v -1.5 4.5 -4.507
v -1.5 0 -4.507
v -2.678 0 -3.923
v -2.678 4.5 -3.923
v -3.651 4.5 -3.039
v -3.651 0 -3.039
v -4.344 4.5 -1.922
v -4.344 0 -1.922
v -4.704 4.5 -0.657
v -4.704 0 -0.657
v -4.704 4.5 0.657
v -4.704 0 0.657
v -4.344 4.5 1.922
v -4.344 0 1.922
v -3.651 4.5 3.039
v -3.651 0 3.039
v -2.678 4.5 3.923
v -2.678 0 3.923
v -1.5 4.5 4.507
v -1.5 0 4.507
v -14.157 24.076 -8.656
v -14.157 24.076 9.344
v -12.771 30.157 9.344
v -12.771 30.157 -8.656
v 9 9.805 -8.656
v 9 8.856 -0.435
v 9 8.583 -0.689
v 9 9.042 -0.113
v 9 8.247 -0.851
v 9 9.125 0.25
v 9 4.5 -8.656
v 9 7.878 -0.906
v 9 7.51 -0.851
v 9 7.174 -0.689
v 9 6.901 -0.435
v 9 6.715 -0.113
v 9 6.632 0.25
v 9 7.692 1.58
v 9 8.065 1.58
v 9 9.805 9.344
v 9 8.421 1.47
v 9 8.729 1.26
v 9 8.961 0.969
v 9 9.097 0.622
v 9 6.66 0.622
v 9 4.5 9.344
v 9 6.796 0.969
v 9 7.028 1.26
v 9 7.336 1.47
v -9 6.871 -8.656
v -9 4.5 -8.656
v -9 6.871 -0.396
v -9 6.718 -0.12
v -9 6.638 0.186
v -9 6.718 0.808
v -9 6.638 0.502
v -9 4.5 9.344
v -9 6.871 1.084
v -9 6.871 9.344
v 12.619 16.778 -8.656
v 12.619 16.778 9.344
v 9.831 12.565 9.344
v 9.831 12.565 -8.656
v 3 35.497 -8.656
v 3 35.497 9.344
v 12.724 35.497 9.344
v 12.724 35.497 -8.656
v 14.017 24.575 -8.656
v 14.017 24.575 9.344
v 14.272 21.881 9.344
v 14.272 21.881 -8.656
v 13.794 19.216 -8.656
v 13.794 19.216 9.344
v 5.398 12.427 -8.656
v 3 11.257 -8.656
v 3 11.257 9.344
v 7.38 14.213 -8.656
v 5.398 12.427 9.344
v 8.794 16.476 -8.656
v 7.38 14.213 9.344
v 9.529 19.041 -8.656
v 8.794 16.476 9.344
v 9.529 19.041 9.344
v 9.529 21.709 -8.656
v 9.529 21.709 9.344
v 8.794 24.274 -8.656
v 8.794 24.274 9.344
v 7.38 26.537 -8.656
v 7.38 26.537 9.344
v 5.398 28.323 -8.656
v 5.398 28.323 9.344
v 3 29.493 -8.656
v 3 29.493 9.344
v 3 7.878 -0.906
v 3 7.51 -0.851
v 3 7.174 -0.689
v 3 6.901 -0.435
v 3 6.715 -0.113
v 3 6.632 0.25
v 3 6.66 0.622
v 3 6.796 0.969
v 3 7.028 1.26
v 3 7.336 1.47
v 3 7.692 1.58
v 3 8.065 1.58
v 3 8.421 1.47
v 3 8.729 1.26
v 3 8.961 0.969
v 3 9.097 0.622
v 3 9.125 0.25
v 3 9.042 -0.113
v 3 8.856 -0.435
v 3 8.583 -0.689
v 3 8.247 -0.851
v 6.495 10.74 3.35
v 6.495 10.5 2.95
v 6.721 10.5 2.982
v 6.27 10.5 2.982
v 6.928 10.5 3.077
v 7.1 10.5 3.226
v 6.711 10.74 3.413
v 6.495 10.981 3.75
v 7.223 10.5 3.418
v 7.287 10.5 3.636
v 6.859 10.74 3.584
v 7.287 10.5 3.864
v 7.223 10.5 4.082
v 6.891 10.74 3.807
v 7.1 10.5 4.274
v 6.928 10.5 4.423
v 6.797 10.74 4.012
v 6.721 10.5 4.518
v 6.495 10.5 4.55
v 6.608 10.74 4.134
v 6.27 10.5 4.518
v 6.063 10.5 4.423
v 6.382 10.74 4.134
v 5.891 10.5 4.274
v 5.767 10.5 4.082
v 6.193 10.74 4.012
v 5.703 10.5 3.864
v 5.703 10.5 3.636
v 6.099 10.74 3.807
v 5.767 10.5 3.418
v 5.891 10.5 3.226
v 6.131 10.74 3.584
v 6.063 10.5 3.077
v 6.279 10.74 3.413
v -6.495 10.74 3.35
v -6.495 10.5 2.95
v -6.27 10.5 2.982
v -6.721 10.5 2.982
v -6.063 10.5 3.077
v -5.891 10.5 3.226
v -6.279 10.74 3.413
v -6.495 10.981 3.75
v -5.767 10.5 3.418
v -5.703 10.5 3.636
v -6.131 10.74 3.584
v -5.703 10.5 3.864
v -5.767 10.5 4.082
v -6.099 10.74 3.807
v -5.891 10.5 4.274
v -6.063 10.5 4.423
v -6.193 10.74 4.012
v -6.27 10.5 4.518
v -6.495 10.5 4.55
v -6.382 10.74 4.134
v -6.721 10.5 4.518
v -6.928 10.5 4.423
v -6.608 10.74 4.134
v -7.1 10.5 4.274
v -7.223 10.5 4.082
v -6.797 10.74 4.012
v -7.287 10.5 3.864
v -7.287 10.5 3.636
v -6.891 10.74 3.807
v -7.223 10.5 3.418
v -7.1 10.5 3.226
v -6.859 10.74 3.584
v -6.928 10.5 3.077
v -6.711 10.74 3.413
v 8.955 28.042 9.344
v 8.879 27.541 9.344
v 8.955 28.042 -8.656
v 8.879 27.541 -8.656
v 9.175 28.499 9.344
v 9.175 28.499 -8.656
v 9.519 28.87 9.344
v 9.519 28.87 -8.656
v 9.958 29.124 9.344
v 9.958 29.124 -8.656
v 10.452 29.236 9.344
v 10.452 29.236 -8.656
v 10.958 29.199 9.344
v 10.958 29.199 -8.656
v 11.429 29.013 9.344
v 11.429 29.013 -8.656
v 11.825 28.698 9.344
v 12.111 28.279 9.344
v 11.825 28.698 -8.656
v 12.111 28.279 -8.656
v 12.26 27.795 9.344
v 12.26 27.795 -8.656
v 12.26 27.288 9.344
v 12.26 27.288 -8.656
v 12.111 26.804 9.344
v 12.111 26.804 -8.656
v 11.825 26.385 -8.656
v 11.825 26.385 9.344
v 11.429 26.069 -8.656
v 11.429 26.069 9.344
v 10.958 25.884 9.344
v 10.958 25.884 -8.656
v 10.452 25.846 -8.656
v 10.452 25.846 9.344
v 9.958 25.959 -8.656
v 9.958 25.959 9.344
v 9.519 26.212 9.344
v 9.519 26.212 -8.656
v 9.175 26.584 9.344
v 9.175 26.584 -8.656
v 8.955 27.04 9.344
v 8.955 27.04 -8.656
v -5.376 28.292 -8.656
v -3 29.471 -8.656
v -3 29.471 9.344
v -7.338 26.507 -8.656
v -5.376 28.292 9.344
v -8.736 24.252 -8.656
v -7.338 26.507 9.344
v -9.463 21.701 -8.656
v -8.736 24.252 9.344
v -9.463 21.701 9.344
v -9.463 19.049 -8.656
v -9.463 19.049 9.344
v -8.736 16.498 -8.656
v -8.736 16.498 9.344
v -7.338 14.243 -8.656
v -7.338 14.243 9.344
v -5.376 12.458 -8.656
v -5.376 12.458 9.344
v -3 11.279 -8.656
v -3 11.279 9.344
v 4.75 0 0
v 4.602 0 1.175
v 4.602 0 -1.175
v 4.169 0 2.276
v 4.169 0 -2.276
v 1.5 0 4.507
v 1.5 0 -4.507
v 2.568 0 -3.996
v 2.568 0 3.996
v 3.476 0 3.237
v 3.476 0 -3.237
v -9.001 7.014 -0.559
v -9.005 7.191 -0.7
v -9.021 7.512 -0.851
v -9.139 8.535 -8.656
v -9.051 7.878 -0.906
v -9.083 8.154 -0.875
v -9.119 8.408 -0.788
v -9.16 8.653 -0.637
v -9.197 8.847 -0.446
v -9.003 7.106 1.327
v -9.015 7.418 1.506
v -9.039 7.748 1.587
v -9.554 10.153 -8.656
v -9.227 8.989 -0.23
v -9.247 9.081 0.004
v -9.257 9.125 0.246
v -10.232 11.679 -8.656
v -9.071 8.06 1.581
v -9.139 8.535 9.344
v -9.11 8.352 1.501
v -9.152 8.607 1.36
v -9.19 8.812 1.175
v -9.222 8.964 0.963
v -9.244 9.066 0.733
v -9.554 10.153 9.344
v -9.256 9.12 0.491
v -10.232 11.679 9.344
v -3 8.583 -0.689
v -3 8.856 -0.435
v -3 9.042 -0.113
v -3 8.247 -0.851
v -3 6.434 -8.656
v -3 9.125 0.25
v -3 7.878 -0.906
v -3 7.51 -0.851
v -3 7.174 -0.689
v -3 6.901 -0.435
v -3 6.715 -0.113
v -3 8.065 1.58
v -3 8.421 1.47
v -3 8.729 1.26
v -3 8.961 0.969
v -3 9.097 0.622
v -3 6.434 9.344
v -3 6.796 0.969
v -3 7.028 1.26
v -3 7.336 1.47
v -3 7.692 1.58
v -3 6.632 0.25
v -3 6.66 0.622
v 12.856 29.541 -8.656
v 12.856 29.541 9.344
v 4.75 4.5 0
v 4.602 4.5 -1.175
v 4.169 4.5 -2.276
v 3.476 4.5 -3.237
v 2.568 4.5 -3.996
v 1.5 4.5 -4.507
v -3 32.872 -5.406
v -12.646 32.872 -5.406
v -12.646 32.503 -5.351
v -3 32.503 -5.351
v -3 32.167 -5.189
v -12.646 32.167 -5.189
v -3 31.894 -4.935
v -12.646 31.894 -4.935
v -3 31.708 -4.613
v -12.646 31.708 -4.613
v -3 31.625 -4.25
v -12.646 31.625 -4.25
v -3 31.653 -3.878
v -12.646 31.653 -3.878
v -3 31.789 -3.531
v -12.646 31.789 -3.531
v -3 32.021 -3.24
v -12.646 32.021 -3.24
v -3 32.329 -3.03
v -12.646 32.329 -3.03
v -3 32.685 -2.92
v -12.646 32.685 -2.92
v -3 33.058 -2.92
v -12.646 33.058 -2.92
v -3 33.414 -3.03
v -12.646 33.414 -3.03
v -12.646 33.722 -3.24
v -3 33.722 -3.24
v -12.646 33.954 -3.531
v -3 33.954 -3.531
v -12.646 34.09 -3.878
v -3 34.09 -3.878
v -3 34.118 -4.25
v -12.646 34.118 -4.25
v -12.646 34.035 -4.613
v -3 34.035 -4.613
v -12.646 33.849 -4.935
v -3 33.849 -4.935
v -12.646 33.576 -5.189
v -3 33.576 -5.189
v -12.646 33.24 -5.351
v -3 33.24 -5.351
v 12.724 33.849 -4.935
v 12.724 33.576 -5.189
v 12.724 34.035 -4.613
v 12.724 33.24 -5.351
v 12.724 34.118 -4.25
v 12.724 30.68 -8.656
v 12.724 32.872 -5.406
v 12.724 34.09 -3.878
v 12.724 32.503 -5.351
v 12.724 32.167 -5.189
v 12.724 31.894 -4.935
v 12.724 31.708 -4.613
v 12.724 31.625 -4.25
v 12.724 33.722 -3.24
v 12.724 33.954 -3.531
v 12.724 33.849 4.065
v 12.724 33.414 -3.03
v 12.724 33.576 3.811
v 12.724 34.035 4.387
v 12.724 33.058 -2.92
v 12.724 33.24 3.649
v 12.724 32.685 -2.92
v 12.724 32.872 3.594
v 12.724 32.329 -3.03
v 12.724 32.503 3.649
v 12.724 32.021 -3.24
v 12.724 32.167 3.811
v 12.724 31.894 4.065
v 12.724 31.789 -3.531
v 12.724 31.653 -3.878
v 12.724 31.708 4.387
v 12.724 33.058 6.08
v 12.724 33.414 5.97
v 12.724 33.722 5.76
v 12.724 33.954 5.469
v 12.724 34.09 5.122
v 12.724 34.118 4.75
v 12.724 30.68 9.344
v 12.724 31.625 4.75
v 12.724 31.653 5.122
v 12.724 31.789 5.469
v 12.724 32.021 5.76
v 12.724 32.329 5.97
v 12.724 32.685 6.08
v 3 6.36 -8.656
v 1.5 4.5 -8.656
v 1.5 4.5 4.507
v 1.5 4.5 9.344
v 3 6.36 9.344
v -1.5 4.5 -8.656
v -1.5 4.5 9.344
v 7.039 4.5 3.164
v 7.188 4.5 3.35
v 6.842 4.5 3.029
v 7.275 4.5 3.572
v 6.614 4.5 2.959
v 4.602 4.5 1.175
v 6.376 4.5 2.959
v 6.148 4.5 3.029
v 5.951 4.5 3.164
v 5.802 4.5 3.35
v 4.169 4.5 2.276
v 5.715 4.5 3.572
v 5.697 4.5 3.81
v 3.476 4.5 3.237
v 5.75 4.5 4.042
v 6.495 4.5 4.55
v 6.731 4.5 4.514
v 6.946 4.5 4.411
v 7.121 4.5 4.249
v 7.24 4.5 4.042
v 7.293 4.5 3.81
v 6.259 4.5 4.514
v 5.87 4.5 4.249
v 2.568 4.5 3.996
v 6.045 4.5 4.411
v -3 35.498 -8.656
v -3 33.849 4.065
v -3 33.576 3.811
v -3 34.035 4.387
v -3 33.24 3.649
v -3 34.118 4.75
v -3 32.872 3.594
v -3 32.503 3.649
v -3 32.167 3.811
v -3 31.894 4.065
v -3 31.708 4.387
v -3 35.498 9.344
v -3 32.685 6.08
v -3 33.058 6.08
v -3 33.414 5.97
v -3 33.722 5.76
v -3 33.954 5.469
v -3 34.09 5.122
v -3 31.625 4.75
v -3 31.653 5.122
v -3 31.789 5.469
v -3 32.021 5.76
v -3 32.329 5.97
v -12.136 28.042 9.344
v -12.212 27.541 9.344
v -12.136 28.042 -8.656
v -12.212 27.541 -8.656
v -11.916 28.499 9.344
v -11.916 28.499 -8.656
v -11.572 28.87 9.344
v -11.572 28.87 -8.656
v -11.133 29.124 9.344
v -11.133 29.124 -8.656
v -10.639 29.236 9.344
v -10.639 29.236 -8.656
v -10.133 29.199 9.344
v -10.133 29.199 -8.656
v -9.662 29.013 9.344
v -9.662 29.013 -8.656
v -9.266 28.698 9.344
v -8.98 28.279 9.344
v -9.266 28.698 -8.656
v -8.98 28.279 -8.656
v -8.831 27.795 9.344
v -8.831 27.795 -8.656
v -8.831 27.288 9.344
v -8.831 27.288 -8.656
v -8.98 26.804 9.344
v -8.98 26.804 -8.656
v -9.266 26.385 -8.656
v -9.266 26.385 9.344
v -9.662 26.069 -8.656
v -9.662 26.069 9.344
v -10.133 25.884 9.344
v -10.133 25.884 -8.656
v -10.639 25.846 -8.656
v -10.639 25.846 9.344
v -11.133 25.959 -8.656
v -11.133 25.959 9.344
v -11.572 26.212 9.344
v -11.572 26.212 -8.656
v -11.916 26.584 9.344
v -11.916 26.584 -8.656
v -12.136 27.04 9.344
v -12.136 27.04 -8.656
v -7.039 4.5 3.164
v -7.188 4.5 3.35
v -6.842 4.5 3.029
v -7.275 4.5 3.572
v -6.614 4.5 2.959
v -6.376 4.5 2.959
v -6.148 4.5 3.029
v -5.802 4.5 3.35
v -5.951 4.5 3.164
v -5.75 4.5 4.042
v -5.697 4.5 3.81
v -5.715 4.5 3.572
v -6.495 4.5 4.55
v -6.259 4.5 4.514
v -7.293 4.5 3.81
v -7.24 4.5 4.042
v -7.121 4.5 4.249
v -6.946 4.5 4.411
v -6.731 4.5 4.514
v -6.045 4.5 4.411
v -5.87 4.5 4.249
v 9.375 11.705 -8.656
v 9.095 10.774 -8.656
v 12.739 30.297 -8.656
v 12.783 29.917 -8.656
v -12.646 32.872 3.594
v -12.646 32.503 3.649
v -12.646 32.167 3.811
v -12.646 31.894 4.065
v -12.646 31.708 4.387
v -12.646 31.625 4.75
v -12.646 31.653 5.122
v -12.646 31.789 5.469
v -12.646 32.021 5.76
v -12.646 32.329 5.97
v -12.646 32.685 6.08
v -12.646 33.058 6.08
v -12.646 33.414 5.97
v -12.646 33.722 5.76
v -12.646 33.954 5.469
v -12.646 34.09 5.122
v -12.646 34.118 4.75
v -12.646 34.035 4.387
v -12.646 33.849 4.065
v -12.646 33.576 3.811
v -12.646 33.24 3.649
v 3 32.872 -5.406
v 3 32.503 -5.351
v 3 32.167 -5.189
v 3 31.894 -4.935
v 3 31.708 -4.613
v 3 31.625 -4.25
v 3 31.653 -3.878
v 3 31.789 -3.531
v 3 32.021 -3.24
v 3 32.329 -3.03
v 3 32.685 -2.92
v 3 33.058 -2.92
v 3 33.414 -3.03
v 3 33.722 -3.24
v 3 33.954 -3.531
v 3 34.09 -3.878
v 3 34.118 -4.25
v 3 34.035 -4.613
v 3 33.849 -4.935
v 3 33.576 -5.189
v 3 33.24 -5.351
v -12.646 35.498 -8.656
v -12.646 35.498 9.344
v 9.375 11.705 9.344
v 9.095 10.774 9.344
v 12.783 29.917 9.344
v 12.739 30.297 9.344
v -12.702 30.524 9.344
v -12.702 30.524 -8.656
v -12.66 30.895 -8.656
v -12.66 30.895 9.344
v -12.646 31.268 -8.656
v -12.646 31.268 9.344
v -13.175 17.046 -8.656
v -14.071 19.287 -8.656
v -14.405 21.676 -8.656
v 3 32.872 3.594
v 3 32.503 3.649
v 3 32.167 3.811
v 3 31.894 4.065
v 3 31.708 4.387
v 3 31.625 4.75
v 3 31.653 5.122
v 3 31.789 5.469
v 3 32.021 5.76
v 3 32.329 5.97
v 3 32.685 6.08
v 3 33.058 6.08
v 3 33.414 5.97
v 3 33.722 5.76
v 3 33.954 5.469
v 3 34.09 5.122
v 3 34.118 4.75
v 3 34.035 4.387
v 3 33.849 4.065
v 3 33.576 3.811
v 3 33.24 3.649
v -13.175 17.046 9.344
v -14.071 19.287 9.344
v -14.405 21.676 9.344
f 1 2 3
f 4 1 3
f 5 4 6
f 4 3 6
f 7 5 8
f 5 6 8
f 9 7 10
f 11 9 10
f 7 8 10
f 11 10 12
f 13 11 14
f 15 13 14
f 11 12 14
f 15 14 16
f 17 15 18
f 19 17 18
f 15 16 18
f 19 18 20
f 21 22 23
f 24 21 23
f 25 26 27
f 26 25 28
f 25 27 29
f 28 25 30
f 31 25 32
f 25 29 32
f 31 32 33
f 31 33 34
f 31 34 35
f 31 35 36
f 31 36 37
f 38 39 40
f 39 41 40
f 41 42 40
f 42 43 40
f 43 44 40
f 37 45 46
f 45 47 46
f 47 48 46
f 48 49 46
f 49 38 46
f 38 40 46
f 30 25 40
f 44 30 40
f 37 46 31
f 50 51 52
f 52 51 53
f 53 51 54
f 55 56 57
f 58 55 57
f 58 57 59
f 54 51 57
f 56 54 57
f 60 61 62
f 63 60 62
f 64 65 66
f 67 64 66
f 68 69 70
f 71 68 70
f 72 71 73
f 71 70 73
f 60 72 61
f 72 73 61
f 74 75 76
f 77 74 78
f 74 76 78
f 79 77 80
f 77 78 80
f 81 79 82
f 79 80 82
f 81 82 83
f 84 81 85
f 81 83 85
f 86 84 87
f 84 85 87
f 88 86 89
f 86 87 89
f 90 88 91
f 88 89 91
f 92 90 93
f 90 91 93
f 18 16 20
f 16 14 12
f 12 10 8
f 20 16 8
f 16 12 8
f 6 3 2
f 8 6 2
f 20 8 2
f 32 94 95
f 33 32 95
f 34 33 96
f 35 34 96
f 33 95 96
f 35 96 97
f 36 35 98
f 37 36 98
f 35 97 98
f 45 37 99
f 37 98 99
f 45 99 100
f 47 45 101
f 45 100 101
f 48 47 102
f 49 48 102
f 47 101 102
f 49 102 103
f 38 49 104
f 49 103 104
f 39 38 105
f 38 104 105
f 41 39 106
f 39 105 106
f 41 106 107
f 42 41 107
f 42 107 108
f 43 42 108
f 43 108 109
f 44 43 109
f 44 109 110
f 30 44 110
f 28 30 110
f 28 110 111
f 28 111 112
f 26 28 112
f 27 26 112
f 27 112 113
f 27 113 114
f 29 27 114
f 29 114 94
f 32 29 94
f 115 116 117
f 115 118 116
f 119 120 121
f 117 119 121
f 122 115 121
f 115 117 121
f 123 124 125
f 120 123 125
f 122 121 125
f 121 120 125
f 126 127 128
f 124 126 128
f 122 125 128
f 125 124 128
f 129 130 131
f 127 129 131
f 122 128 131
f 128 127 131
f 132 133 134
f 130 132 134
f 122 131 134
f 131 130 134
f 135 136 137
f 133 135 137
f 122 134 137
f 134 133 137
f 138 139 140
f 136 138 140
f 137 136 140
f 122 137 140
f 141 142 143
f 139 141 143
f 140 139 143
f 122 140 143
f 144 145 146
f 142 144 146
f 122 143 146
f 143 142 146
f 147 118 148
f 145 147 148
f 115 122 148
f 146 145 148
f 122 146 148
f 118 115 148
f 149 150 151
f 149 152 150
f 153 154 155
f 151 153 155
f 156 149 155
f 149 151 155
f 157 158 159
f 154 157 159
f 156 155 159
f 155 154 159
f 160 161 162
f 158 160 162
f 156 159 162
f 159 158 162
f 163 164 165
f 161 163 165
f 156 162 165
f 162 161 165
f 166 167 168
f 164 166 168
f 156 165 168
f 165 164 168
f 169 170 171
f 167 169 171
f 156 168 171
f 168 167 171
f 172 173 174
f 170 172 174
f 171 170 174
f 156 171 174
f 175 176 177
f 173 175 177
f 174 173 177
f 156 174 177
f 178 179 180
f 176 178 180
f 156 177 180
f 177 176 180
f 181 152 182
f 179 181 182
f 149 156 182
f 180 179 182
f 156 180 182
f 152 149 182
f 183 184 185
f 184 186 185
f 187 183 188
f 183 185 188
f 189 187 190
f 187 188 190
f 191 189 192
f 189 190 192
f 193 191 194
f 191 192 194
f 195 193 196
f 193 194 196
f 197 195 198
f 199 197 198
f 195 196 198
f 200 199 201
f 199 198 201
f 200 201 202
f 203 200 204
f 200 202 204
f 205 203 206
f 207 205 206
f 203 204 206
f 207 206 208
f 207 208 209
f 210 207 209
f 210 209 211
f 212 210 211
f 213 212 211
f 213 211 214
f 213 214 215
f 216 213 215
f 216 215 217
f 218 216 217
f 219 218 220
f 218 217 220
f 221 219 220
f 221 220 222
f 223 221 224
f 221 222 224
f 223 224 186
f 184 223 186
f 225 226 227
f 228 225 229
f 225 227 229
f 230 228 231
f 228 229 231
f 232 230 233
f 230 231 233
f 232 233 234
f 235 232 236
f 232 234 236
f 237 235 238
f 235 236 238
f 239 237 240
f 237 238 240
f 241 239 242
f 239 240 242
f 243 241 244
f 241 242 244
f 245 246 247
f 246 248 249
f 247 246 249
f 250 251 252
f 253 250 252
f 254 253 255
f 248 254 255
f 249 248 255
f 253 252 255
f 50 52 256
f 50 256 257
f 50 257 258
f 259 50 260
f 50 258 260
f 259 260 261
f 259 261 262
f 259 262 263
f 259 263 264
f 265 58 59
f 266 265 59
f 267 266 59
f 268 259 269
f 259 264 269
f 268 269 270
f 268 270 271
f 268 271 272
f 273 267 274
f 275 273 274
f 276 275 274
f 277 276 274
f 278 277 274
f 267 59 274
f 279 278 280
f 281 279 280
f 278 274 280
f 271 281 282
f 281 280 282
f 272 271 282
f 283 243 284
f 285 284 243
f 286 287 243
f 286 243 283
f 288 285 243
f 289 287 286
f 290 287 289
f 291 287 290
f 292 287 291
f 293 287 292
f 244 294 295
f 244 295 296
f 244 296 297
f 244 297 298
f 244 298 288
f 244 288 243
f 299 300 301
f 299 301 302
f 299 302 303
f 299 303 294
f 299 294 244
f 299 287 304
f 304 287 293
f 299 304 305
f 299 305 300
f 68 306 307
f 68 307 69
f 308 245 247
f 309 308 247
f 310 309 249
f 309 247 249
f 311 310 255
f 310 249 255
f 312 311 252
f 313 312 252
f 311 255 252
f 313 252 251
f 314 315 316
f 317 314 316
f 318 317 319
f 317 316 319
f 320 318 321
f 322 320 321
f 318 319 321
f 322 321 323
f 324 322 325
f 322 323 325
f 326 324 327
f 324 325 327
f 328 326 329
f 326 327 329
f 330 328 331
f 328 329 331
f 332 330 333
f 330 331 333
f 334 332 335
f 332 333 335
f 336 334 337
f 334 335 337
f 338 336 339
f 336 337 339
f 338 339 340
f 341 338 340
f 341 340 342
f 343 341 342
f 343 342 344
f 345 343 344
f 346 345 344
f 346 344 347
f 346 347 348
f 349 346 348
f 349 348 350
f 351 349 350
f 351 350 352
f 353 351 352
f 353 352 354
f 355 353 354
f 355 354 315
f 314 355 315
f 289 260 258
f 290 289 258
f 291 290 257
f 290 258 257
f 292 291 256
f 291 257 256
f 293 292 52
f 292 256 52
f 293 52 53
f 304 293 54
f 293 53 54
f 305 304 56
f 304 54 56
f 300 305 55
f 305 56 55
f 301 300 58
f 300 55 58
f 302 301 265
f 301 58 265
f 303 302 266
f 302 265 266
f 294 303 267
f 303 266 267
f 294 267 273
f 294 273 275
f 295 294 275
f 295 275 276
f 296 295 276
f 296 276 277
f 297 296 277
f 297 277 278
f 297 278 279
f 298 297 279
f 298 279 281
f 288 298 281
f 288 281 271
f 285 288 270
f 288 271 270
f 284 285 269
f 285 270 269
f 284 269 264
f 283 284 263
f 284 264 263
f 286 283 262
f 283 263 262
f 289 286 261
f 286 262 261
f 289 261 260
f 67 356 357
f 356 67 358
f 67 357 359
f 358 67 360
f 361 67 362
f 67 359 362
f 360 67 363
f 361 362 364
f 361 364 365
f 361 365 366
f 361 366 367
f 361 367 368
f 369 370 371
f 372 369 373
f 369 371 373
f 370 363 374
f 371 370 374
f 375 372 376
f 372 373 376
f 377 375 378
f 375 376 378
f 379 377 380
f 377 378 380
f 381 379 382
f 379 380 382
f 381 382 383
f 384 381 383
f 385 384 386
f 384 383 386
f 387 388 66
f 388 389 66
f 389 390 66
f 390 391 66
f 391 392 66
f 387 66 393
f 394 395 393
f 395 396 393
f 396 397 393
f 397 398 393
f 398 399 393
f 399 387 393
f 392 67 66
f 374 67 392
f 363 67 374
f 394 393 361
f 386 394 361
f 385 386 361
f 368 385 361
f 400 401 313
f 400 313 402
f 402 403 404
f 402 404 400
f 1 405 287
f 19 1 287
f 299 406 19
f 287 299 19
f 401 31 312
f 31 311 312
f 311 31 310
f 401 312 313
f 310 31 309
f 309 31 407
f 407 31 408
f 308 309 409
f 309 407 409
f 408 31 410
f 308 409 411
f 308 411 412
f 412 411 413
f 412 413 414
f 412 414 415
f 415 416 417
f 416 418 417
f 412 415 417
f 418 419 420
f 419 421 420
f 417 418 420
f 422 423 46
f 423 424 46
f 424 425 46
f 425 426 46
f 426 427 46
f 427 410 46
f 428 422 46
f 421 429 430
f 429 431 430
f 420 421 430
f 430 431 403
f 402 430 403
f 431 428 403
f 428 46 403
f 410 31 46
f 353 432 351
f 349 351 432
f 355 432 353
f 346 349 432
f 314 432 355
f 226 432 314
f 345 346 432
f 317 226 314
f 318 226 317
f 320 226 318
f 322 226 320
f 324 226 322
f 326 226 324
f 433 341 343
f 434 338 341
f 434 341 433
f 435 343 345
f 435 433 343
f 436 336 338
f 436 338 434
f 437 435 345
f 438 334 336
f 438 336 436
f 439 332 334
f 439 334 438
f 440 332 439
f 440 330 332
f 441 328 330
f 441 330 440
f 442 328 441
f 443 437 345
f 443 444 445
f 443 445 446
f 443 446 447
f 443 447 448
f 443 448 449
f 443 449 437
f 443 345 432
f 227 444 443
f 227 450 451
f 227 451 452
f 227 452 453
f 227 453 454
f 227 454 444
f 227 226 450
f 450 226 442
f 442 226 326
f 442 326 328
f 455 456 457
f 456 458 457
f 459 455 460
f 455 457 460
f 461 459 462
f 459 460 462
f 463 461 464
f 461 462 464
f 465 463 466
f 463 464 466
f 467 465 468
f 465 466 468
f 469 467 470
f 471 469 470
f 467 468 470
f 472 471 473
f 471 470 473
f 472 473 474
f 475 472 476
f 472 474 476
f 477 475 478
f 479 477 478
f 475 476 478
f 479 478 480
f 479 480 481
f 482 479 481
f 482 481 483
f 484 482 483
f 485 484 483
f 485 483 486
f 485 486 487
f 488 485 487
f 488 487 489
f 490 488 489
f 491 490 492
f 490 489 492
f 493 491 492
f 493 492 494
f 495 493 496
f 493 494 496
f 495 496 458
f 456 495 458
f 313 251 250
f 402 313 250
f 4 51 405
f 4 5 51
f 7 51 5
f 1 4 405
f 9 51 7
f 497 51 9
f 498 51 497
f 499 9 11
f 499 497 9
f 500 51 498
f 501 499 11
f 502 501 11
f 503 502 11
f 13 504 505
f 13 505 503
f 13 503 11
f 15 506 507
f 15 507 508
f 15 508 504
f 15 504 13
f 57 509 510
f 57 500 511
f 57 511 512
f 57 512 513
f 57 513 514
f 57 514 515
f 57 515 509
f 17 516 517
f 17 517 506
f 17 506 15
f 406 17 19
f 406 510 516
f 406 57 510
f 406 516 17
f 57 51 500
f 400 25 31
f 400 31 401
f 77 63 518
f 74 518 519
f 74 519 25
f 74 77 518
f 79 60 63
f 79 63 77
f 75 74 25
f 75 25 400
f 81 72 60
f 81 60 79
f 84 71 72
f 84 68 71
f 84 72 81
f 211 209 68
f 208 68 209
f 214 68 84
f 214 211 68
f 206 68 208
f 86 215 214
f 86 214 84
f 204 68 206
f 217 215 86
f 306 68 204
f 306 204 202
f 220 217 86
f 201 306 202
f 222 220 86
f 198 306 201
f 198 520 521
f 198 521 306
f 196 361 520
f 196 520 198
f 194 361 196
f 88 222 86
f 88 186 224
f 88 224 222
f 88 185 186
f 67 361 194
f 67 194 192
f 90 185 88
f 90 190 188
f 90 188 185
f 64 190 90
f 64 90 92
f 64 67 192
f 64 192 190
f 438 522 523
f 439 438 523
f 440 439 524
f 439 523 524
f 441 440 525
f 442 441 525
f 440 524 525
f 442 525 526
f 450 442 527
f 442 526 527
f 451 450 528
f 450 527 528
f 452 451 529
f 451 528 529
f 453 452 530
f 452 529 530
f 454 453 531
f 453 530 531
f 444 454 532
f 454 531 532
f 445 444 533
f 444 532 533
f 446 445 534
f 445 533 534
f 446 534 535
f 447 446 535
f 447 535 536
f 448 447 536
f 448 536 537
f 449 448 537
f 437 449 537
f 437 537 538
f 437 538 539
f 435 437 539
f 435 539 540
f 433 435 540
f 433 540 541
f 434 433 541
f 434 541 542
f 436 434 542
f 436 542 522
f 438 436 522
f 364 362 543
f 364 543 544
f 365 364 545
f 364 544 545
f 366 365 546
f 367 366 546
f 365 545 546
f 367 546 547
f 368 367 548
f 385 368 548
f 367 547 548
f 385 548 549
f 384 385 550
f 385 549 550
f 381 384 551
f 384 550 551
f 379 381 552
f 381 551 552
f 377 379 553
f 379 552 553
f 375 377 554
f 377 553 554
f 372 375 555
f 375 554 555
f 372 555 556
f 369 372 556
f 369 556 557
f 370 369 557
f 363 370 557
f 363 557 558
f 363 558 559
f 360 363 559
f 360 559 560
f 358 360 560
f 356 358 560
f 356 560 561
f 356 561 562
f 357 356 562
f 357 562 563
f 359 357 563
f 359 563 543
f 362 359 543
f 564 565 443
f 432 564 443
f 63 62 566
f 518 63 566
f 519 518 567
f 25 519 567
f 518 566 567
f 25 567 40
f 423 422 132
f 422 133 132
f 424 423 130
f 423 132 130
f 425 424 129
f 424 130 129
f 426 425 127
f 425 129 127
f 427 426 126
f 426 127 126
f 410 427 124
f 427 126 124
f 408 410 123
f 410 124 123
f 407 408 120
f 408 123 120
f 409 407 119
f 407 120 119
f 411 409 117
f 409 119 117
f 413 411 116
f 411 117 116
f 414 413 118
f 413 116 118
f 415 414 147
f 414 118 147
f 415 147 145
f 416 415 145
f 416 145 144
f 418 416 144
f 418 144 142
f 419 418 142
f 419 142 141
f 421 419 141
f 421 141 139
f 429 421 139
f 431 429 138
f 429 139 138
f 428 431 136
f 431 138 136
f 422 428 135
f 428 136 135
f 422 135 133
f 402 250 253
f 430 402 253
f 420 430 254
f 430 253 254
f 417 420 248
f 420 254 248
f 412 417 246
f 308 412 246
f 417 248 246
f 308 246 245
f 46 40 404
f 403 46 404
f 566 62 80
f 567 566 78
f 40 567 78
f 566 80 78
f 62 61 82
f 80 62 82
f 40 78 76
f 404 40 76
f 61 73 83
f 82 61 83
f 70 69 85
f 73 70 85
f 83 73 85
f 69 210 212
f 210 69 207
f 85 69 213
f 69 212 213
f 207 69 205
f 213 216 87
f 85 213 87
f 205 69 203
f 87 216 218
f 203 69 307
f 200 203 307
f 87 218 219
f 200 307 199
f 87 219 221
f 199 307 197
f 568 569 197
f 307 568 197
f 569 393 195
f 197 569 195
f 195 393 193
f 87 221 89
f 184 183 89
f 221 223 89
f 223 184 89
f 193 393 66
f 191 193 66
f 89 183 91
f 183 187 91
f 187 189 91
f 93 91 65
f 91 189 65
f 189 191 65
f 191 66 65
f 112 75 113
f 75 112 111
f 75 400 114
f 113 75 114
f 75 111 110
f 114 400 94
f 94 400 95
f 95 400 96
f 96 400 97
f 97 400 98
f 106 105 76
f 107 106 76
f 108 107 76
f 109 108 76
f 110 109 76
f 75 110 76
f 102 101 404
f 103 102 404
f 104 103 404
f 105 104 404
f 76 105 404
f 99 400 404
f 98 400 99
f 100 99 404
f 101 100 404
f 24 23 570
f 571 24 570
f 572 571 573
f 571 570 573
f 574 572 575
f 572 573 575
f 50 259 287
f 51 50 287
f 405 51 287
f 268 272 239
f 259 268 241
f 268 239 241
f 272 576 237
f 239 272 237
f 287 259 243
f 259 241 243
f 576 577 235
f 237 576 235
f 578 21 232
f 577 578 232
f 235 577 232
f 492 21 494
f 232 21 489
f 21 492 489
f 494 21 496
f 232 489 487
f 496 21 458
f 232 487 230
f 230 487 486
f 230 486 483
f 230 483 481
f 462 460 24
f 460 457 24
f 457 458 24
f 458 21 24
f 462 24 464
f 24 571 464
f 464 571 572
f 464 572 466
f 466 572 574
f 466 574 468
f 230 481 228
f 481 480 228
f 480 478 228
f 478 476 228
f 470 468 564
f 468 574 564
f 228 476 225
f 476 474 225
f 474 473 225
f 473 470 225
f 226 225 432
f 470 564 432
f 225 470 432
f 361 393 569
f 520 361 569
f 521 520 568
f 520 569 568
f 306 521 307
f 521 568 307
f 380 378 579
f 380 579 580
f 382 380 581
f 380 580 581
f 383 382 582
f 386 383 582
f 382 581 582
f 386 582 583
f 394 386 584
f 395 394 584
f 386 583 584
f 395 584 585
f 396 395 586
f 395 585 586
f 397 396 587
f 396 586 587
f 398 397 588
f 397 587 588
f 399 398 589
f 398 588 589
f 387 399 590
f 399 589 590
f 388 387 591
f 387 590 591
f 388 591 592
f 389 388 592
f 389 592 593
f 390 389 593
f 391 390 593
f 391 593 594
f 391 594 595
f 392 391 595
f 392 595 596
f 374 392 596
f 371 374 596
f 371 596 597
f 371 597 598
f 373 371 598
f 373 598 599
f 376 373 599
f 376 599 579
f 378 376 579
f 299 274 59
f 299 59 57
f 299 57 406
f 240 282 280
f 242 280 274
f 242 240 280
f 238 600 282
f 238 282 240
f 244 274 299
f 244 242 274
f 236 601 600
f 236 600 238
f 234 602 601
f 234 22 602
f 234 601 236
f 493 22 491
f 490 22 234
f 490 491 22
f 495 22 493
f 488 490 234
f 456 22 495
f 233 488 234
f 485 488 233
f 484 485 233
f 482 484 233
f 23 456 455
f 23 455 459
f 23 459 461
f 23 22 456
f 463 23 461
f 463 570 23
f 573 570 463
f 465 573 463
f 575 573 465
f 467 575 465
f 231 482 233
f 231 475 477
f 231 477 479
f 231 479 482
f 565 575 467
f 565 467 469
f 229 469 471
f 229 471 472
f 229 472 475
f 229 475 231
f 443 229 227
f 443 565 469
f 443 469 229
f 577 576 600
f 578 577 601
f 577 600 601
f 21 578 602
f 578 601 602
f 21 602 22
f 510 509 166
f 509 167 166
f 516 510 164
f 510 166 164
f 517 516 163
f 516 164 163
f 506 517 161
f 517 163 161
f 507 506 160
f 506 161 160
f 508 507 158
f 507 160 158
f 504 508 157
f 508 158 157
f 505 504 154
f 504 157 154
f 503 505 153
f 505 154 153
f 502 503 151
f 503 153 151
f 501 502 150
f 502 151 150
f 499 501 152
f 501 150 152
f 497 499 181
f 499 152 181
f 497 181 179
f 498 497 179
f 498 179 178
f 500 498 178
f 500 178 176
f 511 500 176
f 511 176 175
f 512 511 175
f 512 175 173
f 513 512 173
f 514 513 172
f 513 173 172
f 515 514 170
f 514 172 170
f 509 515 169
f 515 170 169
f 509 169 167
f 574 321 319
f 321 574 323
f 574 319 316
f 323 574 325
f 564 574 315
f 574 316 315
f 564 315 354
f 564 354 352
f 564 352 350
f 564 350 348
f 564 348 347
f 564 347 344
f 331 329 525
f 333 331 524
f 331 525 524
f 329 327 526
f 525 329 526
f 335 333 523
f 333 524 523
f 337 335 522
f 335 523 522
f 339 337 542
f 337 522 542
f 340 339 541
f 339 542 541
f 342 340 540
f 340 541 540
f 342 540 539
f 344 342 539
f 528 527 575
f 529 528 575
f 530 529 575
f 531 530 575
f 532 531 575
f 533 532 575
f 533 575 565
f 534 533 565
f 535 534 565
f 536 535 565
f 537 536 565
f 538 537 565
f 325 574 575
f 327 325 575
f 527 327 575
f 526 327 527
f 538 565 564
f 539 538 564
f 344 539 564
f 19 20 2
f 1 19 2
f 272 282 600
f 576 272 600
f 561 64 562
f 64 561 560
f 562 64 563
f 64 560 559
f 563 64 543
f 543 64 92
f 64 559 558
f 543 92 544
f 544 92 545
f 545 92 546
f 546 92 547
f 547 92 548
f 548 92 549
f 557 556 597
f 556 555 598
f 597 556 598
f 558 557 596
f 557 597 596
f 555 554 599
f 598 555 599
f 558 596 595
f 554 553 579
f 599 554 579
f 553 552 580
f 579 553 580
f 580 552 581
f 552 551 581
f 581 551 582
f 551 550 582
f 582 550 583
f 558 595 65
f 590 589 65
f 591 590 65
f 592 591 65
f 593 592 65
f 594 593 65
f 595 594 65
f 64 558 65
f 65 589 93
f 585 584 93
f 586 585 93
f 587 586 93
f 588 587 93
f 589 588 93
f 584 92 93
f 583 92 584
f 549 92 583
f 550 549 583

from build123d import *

# Parameters (mm, degrees)
SKETCH2_W                 = 12
SKETCH2_H                 = 18
EXTRUDE1_DEPTH            = 31.75
EXTRUDE1_2_DEPTH          = 31.75
EXTRUDE2_DEPTH            = 4.5
SKETCH4_R                 = 9.5885
MAGNET_CAVITY_DEPTH       = 19
M3X0_5_TAPPED_HOLE1_D     = 2.5
M2X0_4_TAPPED_HOLE2_D     = 1.6
M2X0_4_TAPPED_HOLE2_DEPTH = 6
M2X0_4_TAPPED_HOLE2_TIP   = 0.480688495
M3_CLEARANCE_HOLE1_D      = 3.4
M3_CLEARANCE_HOLE1_DEPTH  = 18
M3_CLEARANCE_HOLE1_TIP    = 1.021463052
EXTRUDE3_DEPTH            = 19
EXTRUDE4_DEPTH            = 18
EXTRUDE5_DEPTH            = 19
EXTRUDE6_DEPTH            = 18


with BuildPart() as part:
    # Sketch2 → Extrude1 (new body)
    with BuildSketch(Plane(origin=(0, 4.5, 0), x_dir=(-1, 0, 0), z_dir=(0, 1, 0))):
        with Locations((9, 0.343878918)):
            Rectangle(SKETCH2_W, SKETCH2_H)
    extrude(amount=EXTRUDE1_DEPTH)



with BuildPart() as body_2:
    # Sketch2 → Extrude1 2 (new body)
    with BuildSketch(Plane(origin=(0, 4.5, 0), x_dir=(-1, 0, 0), z_dir=(0, 1, 0))):
        with Locations((-9, 0.343878918)):
            Rectangle(SKETCH2_W, SKETCH2_H)
    extrude(amount=EXTRUDE1_2_DEPTH)


with BuildPart() as part_1:
    add(part.part)

    add(body_2.part)  # Extrude2 merges body 2
    # Sketch1 → Extrude2 (add)
    with BuildSketch(Plane(origin=(0, 0, 0), x_dir=(1, 0, 0), z_dir=(0, 1, 0))):
        with BuildLine():
            ThreePointArc((4.75, 0), (3.852758752, 2.778263846), (1.5, 4.506939094))
            Line((1.5, 4.506939094), (1.5, -4.506939094))
            ThreePointArc((1.5, -4.506939094), (3.852758752, -2.778263846), (4.75, 0))
        make_face()
        with BuildLine():
            Line((-1.5, -4.506939094), (-1.5, 4.506939094))
            ThreePointArc((-1.5, 4.506939094), (-4.75, 0), (-1.5, -4.506939094))
        make_face()
    extrude(amount=EXTRUDE2_DEPTH)

    # Sketch4 → Magnet Cavity (cut, through all)
    with BuildSketch(Plane.XY.offset(9.343878918)):
        with Locations((0.033766691, 20.375)):
            Circle(SKETCH4_R)
    extrude(amount=-MAGNET_CAVITY_DEPTH, mode=Mode.SUBTRACT)

    # M3x0.5 Tapped Hole1 (through all)
    with Locations(Plane(origin=(15, 32.871578641, 4.843878918), x_dir=(0, 0, 1), z_dir=(1, 0, 0))):
        with Locations((0, 0), (-9, 0), (-4.5, 24.993157282)):
            Hole(M3X0_5_TAPPED_HOLE1_D / 2)

    # M2x0.4 Tapped Hole2
    with Locations(Plane(origin=(-6.495190528, 4.5, 3.75), x_dir=(0, 0, -1), z_dir=(0, -1, 0))):
        with Locations((0, 0), (0, 12.990381056)):
            Hole(M2X0_4_TAPPED_HOLE2_D / 2, depth=M2X0_4_TAPPED_HOLE2_DEPTH)
            with Locations((0, 0, -(M2X0_4_TAPPED_HOLE2_DEPTH + M2X0_4_TAPPED_HOLE2_TIP / 2))):  # 118° drill point
                Cone(0, M2X0_4_TAPPED_HOLE2_D / 2, M2X0_4_TAPPED_HOLE2_TIP, mode=Mode.SUBTRACT)

    # M3 Clearance Hole1
    with Locations(Plane(origin=(-10.511737105, 27.54122981, 9.343878918), x_dir=(1, 0, 0), z_dir=(0, 0, 1))):
        with Locations((0, 0), (21.091007592, 0)):
            Hole(M3_CLEARANCE_HOLE1_D / 2, depth=M3_CLEARANCE_HOLE1_DEPTH)
            with Locations((0, 0, -(M3_CLEARANCE_HOLE1_DEPTH + M3_CLEARANCE_HOLE1_TIP / 2))):  # 118° drill point
                Cone(0, M3_CLEARANCE_HOLE1_D / 2, M3_CLEARANCE_HOLE1_TIP, mode=Mode.SUBTRACT)

    # Trim Sketch → Extrude3 (cut, through all)
    with BuildSketch(Plane.XY.offset(9.343878918)):
        with BuildLine():
            Line((9, 9.805409948), (9, 4.5))
            Line((9, 4.5), (15, 4.5))
            Line((15, 4.5), (15, 36.25))
            Line((15, 36.25), (3, 36.25))
            Line((3, 36.25), (3, 35.497310661))
            Line((3, 35.497310661), (12.724200068, 35.497310661))
            Line((12.724200068, 35.497310661), (12.724200068, 30.679595884))
            ThreePointArc((12.724200068, 30.679595884), (12.757175017, 30.10630526), (12.855664924, 29.540576328))
            Line((12.855664924, 29.540576328), (14.017302884, 24.575362865))
            ThreePointArc((14.017302884, 24.575362865), (14.123221889, 20.532228354), (12.6190094, 16.777830894))
            Line((12.6190094, 16.777830894), (9.830611598, 12.565156378))
            ThreePointArc((9.830611598, 12.565156378), (9.212153824, 11.246426602), (9, 9.805409948))
        make_face()
    extrude(amount=-EXTRUDE3_DEPTH, mode=Mode.SUBTRACT)

    # Sketch26 → Extrude4 (add)
    with BuildSketch(Plane.XY.offset(9.343878918)):
        Polygon((1.5, 4.5), (3, 6.359966873), (3, 4.5), align=None)
    extrude(amount=-EXTRUDE4_DEPTH)

    # Sketch27 → Extrude5 (cut, through all)
    with BuildSketch(Plane.XY.offset(9.343878918)):
        with BuildLine():
            ThreePointArc((-13.174851017, 17.046466622), (-14.310417023, 20.471304097), (-14.156594035, 24.076211914))
            Line((-14.156594035, 24.076211914), (-12.770998882, 30.156772756))
            ThreePointArc((-12.770998882, 30.156772756), (-12.677370472, 30.708713017), (-12.646030039, 31.267660339))
            Line((-12.646030039, 31.267660339), (-12.646030039, 35.497506653))
            Line((-12.646030039, 35.497506653), (-3, 35.497506653))
            Line((-3, 35.497506653), (-3, 36.25))
            Line((-3, 36.25), (-15, 36.25))
            Line((-15, 36.25), (-15, 4.5))
            Line((-15, 4.5), (-9, 4.5))
            Line((-9, 4.5), (-9, 6.871021997))
            ThreePointArc((-9, 6.871021997), (-9.312812767, 9.352635085), (-10.231680704, 11.678992122))
            Line((-10.231680704, 11.678992122), (-13.174851017, 17.046466622))
        make_face()
    extrude(amount=-EXTRUDE5_DEPTH, mode=Mode.SUBTRACT)

    # Sketch28 → Extrude6 (add)
    with BuildSketch(Plane.XY.offset(9.343878918)):
        Polygon((-1.5, 4.5), (-3, 6.43381033), (-3, 4.5), align=None)
    extrude(amount=-EXTRUDE6_DEPTH)


solid = part_1.part
